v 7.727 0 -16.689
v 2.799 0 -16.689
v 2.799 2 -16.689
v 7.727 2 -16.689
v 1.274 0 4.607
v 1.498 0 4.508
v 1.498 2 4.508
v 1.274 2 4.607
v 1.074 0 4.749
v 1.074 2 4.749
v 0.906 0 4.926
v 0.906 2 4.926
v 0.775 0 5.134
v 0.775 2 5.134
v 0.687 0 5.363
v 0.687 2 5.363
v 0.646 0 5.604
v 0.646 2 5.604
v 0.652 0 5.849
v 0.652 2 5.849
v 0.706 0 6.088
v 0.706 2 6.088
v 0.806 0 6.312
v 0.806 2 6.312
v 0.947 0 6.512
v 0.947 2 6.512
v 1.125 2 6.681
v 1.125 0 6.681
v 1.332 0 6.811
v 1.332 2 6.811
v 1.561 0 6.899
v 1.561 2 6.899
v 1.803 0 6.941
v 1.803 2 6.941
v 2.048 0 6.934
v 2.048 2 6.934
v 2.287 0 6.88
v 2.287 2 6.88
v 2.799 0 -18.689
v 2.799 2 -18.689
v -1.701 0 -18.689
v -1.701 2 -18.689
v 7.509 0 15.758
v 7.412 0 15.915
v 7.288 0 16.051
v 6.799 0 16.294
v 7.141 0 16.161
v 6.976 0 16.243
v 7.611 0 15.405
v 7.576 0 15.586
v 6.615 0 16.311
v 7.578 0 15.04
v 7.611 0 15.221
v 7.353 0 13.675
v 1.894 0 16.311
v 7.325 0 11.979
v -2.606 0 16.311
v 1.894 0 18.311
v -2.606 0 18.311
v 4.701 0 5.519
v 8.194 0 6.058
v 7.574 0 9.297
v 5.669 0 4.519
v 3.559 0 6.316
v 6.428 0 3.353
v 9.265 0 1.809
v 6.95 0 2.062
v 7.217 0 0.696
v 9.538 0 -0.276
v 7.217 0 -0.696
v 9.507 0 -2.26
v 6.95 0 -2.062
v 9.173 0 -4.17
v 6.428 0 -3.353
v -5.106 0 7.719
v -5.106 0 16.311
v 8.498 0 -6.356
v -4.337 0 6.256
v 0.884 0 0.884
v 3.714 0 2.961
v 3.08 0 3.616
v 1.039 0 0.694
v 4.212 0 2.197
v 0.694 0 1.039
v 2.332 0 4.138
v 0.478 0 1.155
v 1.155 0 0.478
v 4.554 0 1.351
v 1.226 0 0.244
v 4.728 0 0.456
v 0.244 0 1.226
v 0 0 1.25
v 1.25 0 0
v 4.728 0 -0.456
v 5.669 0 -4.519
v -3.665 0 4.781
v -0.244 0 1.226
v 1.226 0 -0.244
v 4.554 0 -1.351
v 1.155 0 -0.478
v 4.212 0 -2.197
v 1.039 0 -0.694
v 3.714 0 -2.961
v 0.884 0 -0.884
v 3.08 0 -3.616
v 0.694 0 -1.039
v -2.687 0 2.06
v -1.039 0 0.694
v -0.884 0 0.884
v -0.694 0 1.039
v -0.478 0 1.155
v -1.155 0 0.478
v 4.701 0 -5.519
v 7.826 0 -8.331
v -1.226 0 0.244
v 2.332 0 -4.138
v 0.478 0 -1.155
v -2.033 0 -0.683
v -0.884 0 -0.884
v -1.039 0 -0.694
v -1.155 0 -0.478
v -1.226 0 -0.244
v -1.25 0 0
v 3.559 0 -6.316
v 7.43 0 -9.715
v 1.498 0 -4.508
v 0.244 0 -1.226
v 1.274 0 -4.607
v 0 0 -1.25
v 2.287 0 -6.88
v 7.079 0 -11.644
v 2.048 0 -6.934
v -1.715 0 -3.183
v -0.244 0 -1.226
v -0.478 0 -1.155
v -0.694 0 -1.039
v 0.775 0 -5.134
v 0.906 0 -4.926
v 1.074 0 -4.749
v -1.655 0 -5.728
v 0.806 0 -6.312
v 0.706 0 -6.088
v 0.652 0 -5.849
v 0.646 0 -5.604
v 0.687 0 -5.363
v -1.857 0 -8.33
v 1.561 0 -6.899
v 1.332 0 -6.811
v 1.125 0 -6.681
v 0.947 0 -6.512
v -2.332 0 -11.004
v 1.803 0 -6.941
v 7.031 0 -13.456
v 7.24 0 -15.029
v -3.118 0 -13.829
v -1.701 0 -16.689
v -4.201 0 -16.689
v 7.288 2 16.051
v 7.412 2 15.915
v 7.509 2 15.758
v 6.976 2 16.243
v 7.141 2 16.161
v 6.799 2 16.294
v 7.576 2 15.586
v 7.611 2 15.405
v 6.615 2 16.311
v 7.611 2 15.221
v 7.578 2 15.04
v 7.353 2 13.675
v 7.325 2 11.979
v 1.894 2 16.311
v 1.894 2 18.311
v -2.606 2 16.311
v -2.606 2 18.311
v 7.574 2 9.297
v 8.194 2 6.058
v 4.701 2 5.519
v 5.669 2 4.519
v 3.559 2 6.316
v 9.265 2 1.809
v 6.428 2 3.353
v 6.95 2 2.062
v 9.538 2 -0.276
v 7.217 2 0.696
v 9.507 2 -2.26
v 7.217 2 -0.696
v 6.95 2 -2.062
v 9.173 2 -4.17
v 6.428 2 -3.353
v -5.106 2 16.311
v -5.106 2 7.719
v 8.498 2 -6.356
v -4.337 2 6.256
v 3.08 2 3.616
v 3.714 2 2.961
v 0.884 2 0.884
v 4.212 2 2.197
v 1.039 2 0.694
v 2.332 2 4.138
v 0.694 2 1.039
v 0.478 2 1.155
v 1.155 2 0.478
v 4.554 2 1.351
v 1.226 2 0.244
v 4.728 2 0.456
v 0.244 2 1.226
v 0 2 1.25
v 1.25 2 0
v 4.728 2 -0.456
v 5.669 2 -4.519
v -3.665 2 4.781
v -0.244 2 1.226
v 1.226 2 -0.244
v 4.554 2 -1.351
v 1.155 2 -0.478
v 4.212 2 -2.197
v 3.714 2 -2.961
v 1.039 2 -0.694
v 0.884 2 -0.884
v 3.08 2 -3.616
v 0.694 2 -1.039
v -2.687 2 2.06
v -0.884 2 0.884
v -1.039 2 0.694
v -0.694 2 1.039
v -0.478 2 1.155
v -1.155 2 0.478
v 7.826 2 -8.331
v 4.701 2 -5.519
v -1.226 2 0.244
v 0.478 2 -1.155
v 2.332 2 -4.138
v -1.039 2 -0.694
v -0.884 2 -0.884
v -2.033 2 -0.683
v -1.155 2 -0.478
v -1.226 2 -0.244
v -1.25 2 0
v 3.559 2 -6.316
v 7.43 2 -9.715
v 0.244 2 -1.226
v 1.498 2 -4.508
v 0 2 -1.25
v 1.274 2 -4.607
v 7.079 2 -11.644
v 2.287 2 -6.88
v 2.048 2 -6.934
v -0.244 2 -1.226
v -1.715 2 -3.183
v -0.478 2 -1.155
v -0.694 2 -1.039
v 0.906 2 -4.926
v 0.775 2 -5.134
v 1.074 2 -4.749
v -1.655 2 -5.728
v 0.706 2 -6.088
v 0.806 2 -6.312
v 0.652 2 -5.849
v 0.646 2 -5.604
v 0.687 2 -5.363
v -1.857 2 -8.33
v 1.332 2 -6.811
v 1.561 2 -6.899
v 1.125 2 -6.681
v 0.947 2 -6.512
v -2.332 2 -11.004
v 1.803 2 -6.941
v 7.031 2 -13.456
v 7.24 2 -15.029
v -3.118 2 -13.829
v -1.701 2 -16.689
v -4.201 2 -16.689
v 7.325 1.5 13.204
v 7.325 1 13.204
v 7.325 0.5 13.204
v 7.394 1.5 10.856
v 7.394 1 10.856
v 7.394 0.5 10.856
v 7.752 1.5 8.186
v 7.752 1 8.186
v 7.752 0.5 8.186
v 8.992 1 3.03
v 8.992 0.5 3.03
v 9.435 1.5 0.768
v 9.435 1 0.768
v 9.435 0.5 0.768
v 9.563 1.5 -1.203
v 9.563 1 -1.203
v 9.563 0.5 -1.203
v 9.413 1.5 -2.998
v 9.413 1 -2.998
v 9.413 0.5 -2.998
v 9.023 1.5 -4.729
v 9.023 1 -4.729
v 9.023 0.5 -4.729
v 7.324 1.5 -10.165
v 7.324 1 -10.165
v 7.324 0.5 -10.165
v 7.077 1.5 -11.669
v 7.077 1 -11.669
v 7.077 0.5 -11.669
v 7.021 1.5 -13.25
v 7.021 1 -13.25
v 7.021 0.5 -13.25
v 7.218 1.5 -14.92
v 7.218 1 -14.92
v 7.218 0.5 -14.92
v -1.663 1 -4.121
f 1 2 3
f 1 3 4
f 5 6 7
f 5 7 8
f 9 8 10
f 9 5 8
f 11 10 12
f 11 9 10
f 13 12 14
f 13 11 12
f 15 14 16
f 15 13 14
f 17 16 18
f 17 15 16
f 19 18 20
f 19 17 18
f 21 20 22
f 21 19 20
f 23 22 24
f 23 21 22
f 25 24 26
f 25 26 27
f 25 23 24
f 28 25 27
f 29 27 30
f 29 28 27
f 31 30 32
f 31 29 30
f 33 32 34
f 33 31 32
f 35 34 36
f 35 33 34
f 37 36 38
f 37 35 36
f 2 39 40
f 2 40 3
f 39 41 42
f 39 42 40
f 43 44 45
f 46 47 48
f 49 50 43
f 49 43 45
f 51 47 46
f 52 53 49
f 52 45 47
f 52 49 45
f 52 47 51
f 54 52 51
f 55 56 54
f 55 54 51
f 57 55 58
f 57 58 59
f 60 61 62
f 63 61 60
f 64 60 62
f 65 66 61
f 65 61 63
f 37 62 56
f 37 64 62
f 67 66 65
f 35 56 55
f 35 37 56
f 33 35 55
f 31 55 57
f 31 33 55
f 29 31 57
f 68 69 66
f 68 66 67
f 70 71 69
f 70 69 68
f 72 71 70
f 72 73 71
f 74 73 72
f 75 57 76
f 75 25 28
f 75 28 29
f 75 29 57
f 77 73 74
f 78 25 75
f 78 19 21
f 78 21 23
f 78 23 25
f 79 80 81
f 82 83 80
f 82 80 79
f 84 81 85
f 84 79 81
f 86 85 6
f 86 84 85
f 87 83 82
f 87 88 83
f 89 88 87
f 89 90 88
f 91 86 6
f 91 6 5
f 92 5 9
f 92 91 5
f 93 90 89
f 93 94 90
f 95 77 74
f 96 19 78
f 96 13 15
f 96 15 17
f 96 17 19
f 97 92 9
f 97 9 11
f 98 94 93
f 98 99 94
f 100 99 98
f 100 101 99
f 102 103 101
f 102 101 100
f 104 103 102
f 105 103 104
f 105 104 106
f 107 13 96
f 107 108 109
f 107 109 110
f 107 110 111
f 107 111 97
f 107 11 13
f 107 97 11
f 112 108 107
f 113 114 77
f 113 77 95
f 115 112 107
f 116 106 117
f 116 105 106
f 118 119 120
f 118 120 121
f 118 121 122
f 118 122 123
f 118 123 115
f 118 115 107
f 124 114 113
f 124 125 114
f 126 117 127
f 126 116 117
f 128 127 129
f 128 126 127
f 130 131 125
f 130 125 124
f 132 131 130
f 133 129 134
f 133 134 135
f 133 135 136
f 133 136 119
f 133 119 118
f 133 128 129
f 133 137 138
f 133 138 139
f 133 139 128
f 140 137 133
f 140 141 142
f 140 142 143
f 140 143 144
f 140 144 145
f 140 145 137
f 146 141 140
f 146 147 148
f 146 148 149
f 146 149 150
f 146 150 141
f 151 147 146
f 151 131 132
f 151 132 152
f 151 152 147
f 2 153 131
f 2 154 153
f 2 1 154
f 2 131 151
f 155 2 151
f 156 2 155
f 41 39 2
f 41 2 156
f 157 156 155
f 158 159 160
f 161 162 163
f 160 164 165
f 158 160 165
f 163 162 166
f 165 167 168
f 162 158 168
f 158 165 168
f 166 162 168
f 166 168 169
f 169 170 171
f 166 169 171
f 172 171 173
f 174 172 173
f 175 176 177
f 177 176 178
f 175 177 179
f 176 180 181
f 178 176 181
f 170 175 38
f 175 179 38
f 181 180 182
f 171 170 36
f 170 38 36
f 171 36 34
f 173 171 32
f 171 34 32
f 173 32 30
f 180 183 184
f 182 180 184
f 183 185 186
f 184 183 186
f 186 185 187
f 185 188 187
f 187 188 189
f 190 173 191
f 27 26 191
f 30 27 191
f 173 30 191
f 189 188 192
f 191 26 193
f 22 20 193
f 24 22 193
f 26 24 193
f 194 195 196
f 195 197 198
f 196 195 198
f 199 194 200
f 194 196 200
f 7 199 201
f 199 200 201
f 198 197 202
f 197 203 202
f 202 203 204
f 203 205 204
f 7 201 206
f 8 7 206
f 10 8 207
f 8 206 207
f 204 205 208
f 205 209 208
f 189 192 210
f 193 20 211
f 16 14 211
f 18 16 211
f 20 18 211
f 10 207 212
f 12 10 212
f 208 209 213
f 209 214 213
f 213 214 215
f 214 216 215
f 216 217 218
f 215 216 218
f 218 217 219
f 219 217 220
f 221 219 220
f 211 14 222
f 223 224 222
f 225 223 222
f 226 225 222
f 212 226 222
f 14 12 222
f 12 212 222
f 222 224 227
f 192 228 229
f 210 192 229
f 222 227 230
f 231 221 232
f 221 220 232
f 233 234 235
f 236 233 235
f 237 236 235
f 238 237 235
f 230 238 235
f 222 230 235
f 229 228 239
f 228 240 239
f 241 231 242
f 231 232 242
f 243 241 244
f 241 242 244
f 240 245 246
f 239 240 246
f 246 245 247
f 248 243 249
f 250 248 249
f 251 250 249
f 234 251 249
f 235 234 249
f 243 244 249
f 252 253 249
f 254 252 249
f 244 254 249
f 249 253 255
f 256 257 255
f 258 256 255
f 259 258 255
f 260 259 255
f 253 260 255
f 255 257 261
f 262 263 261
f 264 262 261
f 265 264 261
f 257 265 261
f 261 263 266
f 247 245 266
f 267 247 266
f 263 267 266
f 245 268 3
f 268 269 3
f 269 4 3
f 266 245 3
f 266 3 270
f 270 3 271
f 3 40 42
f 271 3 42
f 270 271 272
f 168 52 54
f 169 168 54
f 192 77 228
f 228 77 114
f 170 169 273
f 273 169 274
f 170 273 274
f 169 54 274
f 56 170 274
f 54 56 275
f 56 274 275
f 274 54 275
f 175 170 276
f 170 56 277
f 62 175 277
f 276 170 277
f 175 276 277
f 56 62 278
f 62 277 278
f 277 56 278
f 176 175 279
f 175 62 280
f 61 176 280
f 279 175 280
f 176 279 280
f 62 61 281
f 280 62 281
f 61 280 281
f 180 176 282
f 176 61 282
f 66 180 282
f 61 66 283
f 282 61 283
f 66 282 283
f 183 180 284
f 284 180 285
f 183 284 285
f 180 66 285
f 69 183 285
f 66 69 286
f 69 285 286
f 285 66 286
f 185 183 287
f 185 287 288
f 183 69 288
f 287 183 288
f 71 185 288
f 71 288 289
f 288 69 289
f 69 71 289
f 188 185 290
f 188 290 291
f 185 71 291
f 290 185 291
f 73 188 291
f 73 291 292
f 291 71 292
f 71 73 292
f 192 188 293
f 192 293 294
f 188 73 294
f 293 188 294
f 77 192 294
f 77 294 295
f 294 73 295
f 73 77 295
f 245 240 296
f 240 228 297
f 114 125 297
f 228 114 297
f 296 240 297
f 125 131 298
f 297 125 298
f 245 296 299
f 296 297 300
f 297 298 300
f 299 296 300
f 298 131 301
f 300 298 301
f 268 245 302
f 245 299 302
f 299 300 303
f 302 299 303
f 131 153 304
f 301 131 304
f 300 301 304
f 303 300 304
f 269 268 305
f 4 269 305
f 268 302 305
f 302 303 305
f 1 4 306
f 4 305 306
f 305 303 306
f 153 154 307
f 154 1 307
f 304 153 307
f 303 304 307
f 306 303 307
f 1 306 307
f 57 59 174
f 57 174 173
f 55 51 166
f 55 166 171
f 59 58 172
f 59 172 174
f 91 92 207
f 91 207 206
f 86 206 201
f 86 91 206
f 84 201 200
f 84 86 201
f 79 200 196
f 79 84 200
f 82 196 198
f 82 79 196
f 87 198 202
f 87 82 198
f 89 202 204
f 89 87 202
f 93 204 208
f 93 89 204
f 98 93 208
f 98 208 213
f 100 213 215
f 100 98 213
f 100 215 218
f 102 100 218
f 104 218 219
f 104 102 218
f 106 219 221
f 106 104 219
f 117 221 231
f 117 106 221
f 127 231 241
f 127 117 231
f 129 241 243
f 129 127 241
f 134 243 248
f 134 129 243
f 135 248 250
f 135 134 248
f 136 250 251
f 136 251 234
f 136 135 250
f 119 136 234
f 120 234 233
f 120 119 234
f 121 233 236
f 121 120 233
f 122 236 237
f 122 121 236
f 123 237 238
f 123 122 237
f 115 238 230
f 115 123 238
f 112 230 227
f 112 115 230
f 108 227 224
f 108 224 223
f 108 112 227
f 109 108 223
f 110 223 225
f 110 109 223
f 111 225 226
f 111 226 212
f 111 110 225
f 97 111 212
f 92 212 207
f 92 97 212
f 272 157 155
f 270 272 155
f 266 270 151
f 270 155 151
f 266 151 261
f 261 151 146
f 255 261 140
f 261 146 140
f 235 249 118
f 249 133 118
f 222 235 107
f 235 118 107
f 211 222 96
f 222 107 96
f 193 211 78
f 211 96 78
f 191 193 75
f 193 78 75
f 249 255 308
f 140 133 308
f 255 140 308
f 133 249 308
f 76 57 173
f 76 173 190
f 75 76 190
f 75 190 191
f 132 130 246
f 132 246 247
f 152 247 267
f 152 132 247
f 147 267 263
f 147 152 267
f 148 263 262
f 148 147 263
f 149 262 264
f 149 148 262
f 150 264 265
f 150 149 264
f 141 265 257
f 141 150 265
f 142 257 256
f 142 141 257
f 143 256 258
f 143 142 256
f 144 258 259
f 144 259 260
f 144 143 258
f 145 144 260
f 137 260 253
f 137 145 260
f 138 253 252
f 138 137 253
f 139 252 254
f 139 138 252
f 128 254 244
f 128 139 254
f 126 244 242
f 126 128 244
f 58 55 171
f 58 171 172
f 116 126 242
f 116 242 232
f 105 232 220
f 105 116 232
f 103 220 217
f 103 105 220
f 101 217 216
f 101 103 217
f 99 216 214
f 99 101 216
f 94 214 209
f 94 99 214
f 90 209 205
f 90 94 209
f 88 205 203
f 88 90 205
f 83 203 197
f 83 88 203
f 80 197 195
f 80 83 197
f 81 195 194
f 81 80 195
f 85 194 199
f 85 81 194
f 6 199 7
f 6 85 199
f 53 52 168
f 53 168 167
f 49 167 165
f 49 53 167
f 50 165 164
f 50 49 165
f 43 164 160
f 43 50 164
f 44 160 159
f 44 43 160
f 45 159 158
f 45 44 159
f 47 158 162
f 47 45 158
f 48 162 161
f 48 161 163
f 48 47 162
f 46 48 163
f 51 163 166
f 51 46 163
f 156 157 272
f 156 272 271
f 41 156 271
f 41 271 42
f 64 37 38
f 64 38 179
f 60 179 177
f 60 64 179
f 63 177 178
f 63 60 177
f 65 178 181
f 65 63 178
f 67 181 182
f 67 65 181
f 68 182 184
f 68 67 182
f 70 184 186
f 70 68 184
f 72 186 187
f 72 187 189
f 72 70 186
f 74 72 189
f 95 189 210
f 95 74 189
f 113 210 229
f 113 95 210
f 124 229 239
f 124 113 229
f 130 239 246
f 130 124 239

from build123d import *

# Parameters (mm, degrees)
CROQUIS1_R              = 1.25
SALIENTE_EXTRUIR1_DEPTH = 2


with BuildPart() as part:
    # Croquis1 → Saliente-Extruir1 (new body)
    with BuildSketch(Plane(origin=(0, 0, 0), x_dir=(1, 0, 0), z_dir=(0, 1, 0))):
        with BuildLine():
            Line((-4.20050822, 16.689223124), (-1.70050822, 16.689223124))
            Line((-1.70050822, 16.689223124), (-1.70050822, 18.689223124))
            Line((-1.70050822, 18.689223124), (2.79949178, 18.689223124))
            Line((2.79949178, 18.689223124), (2.79949178, 16.689223124))
            Line((2.79949178, 16.689223124), (7.726600223, 16.689223124))
            add(Edge.make_bspline(
                [(7.577707829, -15.040023689), (7.009095125, -13.018350945), (7.479696929, -8.281838807), (9.837054162, -0.269934456), (9.506886296, 5.625743932), (5.899776863, 11.831578143), (7.726600223, 16.689223124)],
                knots=[0.078667813, 0.078667813, 0.078667813, 0.078667813, 0.337938342, 0.393992599, 0.639210385, 1, 1, 1, 1], degree=3))
            ThreePointArc((7.577707829, -15.040023689), (7.412164162, -15.914617423), (6.615059029, -16.310776876))
            Line((6.615059029, -16.310776876), (1.893728582, -16.310776876))
            Line((1.893728582, -16.310776876), (1.893728582, -18.310776876))
            Line((1.893728582, -18.310776876), (-2.606271418, -18.310776876))
            Line((-2.606271418, -18.310776876), (-2.606271418, -16.310776876))
            Line((-2.606271418, -16.310776876), (-5.106271418, -16.310776876))
            Line((-5.106271418, -16.310776876), (-5.106271418, -7.718861624))
            add(Edge.make_bspline(
                [(-4.20050822, 16.689223124), (1.327651649, 3.755856275), (-5.106271418, -7.718861624)],
                knots=[0, 0, 0, 1, 1, 1], degree=2))
        make_face()
        with Locations(Location((0, 0, 0), (0, 0, 270))):
            Circle(CROQUIS1_R, mode=Mode.SUBTRACT)
        with BuildLine():
            ThreePointArc((2.286674037, -6.879943448), (7.25, 0), (2.286674037, 6.879943448))
            ThreePointArc((2.286674037, 6.879943448), (0.706222747, 6.088000446), (1.498165749, 4.507549156))
            ThreePointArc((1.498165749, 4.507549156), (4.75, 0), (1.498165749, -4.507549156))
            ThreePointArc((1.498165749, -4.507549156), (0.706222747, -6.088000446), (2.286674037, -6.879943448))
        make_face(mode=Mode.SUBTRACT)
    extrude(amount=SALIENTE_EXTRUIR1_DEPTH)


solid = part.part
